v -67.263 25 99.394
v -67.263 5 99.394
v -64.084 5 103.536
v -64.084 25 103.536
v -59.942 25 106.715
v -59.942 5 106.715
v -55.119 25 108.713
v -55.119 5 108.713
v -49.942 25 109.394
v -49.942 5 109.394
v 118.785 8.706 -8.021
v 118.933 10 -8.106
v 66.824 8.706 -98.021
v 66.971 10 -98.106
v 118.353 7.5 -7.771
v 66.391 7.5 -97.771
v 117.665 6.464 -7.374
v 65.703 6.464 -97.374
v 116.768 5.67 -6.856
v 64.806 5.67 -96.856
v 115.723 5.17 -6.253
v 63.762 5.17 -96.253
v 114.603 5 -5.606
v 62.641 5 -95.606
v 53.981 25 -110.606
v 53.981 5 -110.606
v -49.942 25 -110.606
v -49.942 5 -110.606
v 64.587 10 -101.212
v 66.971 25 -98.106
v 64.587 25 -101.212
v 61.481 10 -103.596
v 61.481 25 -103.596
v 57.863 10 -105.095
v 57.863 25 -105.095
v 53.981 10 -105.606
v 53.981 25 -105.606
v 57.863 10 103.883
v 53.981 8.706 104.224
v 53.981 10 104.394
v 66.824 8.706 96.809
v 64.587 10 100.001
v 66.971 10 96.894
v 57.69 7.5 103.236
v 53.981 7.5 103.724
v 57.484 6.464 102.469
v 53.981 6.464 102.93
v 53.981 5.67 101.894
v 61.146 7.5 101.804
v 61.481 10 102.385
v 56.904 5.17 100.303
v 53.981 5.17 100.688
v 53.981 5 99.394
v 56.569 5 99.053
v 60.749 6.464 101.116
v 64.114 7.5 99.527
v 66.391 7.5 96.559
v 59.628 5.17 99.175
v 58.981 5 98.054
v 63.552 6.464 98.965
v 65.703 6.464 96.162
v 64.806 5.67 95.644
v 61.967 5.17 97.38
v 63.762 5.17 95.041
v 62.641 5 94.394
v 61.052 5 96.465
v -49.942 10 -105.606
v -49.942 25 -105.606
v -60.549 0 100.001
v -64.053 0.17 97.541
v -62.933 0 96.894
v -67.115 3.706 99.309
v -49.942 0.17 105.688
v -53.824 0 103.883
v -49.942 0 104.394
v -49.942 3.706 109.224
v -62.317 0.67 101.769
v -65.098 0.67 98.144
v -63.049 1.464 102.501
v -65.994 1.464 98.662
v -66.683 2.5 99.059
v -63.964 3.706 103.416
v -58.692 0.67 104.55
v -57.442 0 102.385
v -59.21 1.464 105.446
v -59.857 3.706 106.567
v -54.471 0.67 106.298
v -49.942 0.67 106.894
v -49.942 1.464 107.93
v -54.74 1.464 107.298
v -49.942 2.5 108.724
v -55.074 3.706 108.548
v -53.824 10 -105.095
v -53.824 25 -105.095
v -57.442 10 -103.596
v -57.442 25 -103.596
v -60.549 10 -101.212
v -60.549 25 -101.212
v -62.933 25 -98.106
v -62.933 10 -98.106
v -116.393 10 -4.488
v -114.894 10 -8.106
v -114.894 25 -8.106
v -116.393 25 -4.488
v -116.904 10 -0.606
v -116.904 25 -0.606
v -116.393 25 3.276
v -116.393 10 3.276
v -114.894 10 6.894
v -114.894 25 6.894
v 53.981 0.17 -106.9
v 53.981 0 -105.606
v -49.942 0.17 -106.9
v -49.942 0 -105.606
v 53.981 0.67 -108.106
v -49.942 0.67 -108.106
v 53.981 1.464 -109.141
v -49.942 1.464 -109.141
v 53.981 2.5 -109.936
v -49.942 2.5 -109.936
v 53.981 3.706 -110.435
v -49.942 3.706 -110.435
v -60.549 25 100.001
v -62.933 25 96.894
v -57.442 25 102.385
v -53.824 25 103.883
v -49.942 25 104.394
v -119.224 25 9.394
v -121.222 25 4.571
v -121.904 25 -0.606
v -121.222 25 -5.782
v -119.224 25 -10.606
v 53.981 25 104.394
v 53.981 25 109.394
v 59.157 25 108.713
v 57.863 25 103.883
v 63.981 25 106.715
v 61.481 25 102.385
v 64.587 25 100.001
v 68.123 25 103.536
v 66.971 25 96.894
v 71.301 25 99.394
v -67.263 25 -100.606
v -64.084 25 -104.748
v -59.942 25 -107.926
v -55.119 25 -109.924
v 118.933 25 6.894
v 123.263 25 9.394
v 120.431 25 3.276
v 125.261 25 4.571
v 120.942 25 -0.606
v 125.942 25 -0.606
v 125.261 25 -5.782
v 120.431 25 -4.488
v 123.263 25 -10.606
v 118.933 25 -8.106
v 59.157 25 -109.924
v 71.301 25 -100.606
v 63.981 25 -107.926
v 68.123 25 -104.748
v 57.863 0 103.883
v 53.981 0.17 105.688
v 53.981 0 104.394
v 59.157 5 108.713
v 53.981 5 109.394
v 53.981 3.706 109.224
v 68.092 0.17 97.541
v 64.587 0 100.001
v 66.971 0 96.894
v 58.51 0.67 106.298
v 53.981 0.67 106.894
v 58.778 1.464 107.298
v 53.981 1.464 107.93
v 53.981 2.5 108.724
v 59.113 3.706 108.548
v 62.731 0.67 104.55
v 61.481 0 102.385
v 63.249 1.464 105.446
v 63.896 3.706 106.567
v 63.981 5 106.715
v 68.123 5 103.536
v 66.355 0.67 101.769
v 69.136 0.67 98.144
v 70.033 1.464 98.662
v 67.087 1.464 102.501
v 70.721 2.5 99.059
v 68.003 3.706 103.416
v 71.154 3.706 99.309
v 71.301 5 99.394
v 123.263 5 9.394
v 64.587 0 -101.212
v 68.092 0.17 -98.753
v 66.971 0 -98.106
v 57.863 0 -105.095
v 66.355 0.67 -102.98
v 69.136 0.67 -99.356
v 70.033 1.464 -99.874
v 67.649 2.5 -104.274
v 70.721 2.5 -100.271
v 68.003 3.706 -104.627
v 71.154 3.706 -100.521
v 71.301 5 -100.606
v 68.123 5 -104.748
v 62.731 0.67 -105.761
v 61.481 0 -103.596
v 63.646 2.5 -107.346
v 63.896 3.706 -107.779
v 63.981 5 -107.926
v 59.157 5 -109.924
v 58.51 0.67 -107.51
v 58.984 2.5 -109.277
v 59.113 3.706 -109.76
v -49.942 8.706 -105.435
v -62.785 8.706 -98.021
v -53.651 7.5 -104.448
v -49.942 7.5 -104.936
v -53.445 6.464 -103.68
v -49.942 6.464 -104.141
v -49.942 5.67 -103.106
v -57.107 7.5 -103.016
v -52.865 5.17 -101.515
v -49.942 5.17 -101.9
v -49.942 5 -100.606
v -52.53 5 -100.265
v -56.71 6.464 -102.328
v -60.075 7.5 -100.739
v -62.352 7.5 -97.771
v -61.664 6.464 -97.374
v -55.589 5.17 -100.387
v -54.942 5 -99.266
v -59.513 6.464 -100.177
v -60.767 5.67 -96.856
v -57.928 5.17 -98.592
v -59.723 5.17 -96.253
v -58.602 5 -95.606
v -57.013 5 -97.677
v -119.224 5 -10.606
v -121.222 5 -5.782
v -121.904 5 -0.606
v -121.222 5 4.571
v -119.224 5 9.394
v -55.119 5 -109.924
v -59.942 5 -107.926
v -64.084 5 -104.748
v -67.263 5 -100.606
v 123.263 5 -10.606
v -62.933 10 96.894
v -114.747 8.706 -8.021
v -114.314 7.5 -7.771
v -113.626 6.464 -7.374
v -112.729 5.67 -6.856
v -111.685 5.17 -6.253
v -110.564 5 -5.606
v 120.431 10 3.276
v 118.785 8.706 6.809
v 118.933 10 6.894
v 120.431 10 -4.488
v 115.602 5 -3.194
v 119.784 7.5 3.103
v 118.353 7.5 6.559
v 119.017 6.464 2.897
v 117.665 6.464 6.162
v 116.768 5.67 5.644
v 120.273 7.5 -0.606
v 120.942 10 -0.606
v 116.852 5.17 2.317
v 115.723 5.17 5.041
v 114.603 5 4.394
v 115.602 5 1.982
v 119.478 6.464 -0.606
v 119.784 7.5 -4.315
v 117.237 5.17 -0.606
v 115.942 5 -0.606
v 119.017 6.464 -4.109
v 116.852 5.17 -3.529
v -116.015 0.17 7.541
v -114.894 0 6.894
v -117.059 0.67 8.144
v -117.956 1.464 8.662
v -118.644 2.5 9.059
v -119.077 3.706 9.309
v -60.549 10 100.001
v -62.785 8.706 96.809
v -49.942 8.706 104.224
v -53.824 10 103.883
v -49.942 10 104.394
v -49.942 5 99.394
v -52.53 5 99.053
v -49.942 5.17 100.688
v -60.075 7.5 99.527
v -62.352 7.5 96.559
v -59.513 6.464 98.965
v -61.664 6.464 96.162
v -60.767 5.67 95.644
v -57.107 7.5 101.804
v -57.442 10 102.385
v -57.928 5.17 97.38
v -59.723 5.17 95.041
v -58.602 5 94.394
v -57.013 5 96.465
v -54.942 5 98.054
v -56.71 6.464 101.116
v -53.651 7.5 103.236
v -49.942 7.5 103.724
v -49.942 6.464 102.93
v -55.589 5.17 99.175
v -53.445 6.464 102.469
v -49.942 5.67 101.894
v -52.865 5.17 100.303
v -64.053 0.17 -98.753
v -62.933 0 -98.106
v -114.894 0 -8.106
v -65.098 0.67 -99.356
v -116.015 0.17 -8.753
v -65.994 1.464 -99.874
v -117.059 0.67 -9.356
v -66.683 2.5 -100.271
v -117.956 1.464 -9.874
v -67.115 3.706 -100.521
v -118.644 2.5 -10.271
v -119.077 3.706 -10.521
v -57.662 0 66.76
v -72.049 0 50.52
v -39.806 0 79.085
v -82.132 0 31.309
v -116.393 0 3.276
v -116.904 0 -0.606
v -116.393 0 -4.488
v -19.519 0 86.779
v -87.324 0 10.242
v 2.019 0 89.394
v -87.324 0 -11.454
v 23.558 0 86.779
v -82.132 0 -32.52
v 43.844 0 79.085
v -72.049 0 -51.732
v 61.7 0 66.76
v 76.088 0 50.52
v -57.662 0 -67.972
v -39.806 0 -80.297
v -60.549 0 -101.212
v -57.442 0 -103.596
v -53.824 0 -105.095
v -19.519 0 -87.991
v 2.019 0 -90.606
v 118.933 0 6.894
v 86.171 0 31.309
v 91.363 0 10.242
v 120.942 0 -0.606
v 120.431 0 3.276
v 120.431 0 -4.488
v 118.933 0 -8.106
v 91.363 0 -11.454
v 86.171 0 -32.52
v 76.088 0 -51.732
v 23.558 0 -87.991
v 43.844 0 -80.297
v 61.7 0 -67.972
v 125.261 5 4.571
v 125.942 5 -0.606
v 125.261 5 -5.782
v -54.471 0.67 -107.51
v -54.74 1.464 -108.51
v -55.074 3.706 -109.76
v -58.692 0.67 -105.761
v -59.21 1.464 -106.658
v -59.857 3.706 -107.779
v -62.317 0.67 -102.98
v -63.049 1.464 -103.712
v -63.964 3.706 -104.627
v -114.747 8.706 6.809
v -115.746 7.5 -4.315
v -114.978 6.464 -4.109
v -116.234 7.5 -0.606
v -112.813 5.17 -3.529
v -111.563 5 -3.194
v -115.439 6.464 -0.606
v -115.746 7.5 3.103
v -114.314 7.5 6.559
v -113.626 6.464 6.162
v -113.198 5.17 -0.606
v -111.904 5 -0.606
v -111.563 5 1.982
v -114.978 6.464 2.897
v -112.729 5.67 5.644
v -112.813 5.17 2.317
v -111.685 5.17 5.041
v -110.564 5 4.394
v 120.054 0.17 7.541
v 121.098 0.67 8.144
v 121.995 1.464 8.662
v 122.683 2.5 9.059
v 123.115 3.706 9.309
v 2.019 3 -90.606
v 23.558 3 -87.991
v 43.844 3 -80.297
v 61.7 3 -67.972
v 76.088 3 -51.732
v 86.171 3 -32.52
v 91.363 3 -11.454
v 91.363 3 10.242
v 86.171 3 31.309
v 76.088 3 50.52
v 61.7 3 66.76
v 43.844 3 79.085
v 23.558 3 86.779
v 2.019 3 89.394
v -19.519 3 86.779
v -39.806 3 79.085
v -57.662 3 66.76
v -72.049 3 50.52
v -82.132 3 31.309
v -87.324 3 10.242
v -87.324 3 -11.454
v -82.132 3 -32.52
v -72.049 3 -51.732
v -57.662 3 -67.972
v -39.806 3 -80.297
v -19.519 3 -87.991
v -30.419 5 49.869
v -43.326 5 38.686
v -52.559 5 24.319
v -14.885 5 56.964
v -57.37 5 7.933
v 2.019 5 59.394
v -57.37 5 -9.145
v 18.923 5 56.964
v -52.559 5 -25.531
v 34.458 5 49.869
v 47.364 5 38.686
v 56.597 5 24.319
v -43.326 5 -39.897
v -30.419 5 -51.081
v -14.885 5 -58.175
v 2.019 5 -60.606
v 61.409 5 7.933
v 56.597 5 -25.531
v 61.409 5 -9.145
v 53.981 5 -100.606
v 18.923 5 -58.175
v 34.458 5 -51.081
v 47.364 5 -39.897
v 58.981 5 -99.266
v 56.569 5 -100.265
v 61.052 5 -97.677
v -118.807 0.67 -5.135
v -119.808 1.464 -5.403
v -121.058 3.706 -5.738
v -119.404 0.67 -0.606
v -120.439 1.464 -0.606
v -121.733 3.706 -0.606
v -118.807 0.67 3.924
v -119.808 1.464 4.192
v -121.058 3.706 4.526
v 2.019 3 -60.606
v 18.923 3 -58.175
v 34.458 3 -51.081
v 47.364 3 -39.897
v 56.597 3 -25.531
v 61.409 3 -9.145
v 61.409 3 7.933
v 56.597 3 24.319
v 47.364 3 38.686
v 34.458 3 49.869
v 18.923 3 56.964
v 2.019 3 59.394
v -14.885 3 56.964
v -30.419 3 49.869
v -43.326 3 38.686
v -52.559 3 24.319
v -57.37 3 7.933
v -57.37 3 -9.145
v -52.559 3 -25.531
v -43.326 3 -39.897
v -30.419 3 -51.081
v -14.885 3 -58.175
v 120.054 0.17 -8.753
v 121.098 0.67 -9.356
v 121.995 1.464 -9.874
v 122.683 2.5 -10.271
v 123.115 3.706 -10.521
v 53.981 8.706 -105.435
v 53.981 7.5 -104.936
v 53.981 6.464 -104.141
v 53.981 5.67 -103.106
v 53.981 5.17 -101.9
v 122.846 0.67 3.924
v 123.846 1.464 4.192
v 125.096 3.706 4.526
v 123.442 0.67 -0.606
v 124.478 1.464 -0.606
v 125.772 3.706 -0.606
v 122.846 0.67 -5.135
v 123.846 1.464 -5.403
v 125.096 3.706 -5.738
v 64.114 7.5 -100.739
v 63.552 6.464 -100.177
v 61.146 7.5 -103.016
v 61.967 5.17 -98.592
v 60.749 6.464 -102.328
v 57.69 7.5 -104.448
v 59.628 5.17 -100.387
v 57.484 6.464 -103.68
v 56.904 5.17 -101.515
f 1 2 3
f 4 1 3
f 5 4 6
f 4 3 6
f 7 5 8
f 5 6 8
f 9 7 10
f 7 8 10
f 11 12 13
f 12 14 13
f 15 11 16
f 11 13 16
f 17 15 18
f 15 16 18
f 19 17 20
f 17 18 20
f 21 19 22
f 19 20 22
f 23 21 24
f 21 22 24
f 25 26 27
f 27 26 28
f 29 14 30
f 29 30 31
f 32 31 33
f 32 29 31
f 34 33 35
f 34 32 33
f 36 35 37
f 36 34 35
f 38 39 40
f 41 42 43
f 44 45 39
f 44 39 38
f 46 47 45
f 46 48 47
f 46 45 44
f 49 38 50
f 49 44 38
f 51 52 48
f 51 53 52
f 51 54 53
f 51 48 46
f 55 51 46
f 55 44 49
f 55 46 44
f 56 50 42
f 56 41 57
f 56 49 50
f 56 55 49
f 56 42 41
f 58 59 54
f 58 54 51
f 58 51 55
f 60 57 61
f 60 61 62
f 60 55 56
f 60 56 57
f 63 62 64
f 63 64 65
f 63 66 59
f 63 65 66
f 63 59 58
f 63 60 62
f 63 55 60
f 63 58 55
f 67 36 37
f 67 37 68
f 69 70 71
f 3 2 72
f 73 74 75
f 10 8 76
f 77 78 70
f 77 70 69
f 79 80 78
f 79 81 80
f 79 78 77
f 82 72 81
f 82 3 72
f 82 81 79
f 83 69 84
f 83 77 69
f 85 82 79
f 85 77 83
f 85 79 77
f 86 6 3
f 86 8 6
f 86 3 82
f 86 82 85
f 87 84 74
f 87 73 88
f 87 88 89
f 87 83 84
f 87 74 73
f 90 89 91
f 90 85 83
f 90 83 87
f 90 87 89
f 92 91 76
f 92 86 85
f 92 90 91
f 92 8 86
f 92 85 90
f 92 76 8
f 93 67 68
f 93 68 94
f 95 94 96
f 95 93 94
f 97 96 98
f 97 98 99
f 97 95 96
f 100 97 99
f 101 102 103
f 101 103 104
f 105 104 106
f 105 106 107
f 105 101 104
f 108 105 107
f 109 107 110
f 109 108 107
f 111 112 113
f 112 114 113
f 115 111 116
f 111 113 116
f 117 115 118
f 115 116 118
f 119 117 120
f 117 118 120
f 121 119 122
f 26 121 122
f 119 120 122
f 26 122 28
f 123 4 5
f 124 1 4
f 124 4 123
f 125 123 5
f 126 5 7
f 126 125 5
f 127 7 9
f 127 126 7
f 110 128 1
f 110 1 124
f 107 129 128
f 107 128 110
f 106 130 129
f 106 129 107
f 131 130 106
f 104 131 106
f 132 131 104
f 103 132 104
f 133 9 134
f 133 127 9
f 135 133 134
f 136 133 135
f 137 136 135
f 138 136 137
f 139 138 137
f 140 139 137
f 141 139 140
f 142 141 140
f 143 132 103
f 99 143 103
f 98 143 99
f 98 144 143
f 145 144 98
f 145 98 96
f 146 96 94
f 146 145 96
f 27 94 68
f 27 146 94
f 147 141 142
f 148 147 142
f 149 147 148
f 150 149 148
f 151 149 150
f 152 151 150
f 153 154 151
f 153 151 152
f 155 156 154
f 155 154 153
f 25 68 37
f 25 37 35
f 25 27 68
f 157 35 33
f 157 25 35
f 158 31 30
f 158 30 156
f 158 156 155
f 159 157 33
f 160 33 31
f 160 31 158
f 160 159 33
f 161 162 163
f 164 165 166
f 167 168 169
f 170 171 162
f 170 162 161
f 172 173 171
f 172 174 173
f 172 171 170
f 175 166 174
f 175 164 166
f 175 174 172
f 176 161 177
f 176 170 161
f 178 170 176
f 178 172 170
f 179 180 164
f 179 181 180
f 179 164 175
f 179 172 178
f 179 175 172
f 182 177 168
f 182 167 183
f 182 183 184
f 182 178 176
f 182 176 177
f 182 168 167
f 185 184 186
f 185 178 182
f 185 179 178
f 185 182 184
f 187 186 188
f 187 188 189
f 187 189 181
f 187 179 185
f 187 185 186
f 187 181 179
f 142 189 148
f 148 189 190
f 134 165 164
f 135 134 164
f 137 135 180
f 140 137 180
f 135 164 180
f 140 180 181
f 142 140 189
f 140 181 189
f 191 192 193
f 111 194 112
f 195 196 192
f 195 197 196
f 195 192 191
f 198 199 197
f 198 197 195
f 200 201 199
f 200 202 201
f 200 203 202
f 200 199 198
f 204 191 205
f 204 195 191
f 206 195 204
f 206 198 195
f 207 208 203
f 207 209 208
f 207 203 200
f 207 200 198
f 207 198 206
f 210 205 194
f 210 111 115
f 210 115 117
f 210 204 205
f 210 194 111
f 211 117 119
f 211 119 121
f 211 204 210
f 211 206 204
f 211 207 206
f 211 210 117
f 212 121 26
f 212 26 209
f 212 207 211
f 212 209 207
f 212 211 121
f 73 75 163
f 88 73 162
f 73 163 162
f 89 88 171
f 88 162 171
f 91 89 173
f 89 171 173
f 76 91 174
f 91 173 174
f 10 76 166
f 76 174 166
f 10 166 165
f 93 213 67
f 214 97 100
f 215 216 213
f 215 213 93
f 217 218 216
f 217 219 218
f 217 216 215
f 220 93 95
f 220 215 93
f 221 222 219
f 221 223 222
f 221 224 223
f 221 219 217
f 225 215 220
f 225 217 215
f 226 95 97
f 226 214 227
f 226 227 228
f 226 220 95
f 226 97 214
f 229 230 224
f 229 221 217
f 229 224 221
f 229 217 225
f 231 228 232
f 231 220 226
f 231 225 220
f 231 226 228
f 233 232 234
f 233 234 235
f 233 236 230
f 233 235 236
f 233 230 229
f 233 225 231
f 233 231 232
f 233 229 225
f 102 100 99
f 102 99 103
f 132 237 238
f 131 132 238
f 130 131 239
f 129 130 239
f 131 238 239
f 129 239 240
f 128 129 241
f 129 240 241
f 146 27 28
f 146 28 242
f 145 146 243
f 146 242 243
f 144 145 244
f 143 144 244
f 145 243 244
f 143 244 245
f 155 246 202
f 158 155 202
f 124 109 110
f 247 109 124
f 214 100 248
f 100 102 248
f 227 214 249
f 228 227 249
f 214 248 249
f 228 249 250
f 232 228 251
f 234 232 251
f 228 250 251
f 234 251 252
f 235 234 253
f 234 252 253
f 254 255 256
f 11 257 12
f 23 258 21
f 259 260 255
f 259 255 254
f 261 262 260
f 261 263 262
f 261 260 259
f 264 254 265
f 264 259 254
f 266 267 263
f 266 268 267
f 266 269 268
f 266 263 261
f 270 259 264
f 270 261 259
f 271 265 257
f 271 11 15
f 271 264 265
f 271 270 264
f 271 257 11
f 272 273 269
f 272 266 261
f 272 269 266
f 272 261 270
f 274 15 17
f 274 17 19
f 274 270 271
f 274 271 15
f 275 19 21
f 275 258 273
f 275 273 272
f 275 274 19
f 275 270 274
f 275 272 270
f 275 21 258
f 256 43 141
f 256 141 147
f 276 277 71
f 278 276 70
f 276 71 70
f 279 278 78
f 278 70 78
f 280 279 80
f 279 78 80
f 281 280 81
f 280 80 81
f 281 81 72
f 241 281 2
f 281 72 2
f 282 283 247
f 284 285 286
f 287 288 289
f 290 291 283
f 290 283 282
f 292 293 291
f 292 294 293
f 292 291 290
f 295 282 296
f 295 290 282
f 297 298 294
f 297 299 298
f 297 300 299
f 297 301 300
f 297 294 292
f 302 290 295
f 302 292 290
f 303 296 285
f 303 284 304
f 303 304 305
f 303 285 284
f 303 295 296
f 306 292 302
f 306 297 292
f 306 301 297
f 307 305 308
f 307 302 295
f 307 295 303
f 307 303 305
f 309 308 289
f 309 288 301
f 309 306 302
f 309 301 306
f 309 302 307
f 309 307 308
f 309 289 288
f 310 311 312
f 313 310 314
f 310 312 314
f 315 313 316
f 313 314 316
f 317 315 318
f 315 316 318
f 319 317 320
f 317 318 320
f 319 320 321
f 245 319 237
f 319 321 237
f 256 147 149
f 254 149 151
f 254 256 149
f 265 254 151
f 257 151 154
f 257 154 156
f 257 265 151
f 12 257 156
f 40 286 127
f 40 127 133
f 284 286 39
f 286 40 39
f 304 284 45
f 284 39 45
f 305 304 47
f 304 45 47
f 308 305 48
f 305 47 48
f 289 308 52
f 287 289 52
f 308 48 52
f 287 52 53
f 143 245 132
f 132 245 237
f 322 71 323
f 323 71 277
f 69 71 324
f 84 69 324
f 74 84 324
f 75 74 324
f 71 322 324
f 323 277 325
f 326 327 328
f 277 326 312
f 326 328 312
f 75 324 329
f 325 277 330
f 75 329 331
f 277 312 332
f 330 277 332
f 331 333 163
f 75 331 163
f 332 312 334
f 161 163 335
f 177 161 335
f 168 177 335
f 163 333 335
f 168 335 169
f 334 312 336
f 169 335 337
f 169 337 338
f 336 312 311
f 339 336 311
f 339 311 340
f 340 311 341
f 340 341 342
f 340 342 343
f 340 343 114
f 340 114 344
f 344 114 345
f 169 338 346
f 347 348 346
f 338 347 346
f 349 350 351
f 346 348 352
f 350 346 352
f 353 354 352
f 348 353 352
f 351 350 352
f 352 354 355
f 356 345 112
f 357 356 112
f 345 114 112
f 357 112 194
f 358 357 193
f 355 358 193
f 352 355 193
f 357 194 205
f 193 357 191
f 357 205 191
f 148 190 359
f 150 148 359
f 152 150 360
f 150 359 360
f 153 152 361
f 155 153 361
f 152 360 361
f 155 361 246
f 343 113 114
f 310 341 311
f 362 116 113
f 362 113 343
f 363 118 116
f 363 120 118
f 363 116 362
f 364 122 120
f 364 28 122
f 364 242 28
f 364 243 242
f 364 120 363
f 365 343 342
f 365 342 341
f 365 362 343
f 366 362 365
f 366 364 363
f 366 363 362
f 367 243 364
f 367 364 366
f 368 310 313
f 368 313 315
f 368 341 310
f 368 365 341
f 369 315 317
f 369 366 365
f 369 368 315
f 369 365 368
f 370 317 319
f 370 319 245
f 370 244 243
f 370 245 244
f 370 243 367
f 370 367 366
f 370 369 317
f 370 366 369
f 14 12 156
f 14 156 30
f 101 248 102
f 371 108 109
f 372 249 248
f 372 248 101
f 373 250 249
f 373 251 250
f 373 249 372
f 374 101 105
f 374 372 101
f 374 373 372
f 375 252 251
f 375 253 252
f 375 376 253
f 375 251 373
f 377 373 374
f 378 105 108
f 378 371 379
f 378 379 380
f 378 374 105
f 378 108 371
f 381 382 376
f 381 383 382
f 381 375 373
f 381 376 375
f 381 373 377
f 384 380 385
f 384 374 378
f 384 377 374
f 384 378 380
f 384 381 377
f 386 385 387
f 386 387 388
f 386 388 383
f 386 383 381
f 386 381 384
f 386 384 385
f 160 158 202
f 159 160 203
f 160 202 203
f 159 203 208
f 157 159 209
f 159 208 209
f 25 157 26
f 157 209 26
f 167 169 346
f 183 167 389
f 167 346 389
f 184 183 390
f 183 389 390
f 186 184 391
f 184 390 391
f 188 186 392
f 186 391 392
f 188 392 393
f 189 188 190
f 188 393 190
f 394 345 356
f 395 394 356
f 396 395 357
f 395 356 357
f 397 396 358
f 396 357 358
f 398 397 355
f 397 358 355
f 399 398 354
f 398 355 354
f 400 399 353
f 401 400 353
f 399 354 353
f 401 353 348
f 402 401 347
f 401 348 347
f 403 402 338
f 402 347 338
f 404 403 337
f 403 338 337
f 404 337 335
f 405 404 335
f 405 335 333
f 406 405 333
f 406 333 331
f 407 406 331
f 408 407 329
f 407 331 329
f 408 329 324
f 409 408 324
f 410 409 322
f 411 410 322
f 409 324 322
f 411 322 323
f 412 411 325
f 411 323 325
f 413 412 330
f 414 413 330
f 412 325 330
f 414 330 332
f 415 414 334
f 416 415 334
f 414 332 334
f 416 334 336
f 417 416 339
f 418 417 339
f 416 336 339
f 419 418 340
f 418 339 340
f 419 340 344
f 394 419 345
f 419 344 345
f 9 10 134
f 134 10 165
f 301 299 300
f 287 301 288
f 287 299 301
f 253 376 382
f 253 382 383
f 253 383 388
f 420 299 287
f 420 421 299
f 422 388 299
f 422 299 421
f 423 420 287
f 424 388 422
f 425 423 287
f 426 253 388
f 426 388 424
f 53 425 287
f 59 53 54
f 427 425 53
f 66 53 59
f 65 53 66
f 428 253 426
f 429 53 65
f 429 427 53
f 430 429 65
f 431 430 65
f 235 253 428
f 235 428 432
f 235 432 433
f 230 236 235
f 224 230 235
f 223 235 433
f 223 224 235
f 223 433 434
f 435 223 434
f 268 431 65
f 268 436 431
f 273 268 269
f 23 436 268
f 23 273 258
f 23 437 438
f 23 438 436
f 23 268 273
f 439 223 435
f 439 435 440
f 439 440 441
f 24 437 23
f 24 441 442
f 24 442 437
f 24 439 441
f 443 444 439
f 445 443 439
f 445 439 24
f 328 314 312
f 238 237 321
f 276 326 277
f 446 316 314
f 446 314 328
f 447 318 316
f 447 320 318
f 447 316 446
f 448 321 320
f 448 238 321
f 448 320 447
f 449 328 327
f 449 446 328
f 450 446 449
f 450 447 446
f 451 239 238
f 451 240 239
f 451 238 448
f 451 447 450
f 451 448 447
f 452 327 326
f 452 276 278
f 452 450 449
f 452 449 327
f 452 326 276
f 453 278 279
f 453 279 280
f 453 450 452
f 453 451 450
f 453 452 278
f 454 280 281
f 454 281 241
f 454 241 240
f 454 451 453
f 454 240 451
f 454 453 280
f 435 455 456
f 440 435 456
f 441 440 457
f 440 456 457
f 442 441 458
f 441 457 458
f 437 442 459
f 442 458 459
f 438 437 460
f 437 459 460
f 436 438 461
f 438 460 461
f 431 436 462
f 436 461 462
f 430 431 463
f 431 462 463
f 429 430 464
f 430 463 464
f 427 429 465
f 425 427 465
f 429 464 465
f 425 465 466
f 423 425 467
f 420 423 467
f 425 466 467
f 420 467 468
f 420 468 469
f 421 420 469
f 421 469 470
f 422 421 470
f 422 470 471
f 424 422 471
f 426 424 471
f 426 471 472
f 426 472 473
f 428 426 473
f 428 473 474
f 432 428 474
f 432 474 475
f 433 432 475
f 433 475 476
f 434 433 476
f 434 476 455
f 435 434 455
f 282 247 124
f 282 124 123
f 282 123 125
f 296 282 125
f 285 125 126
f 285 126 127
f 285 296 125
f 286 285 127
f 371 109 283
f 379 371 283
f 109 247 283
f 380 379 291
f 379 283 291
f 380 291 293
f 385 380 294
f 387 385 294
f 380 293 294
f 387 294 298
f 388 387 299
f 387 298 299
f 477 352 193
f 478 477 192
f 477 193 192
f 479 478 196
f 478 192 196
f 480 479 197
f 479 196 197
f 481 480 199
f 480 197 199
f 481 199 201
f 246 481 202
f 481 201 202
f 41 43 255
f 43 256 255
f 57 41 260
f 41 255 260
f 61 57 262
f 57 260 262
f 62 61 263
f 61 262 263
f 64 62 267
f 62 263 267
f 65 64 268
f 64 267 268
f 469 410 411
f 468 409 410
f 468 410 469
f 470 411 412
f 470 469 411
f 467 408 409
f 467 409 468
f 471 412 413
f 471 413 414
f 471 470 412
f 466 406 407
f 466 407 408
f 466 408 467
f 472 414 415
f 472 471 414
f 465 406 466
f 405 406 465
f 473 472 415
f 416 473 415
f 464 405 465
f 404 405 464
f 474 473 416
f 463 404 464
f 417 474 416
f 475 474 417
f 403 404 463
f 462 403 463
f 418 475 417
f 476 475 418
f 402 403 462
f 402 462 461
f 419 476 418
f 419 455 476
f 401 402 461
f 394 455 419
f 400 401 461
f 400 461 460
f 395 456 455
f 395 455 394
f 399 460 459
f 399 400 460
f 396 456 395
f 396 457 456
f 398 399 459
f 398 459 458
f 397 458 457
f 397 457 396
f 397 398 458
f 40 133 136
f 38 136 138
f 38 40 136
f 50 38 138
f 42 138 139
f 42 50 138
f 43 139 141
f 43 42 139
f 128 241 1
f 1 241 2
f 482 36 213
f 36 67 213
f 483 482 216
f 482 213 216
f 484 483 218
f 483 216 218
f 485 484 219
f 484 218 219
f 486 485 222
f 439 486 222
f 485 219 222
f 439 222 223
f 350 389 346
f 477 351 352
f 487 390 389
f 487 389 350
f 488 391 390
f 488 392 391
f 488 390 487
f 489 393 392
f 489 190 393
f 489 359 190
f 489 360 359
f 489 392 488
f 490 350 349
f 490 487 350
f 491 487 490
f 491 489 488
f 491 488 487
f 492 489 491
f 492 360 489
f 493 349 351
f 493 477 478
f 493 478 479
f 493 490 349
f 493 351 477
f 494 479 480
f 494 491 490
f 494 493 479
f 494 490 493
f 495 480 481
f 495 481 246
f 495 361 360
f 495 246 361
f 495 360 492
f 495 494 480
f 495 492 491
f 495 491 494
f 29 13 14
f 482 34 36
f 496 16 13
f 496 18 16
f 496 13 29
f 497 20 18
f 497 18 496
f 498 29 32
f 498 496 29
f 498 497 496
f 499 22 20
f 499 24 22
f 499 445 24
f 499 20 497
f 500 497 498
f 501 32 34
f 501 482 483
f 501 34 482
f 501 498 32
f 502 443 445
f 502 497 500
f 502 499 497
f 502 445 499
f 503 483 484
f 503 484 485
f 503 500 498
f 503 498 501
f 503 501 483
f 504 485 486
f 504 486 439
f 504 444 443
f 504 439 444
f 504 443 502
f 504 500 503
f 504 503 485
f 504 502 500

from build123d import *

# Parameters (mm, degrees)
SALIENTE_EXTRUIR2_DEPTH = 5
SALIENTE_EXTRUIR3_DEPTH = 20
REDONDEO2_R             = 5
REDONDEO3_R             = 5
CROQUIS4_R              = 60
CORTAR_EXTRUIR1_DEPTH   = 10
CROQUIS3_R              = 90
CORTAR_EXTRUIR2_DEPTH   = 3


with BuildPart() as part:
    # Croquis1 → Saliente-Extruir2 (new body)
    with BuildSketch(Plane(origin=(0, 0, 0), x_dir=(1, 0, 0), z_dir=(0, 1, 0))):
        with BuildLine():
            Line((-119.224191345, -9.394190445), (-67.262667118, -99.394190445))
            ThreePointArc((-67.262667118, -99.394190445), (-59.942159042, -106.71469852), (-49.942159042, -109.394190445))
            Line((-49.942159042, -109.394190445), (53.980889412, -109.394190445))
            ThreePointArc((53.980889412, -109.394190445), (63.980889412, -106.71469852), (71.301397487, -99.394190445))
            Line((71.301397487, -99.394190445), (123.262921714, -9.394190445))
            ThreePointArc((123.262921714, -9.394190445), (125.942413639, 0.605809555), (123.262921714, 10.605809555))
            Line((123.262921714, 10.605809555), (71.301397487, 100.605809555))
            ThreePointArc((71.301397487, 100.605809555), (63.980889412, 107.926317631), (53.980889412, 110.605809555))
            Line((53.980889412, 110.605809555), (-49.942159042, 110.605809555))
            ThreePointArc((-49.942159042, 110.605809555), (-59.942159042, 107.926317631), (-67.262667118, 100.605809555))
            Line((-67.262667118, 100.605809555), (-119.224191345, 10.605809555))
            ThreePointArc((-119.224191345, 10.605809555), (-121.90368327, 0.605809555), (-119.224191345, -9.394190445))
        make_face()
    extrude(amount=SALIENTE_EXTRUIR2_DEPTH)

    # Croquis2 → Saliente-Extruir3 (add)
    with BuildSketch(Plane(origin=(0, 5, 0), x_dir=(1, 0, 0), z_dir=(0, 1, 0))):
        with BuildLine():
            Line((-67.262667118, 100.605809555), (-119.224191345, 10.605809555))
            ThreePointArc((-119.224191345, 10.605809555), (-121.90368327, 0.605809555), (-119.224191345, -9.394190445))
            Line((-119.224191345, -9.394190445), (-67.262667118, -99.394190445))
            ThreePointArc((-67.262667118, -99.394190445), (-59.942159042, -106.71469852), (-49.942159042, -109.394190445))
            Line((-49.942159042, -109.394190445), (53.980889412, -109.394190445))
            ThreePointArc((53.980889412, -109.394190445), (63.980889412, -106.71469852), (71.301397487, -99.394190445))
            Line((71.301397487, -99.394190445), (123.262921714, -9.394190445))
            ThreePointArc((123.262921714, -9.394190445), (125.942413639, 0.605809555), (123.262921714, 10.605809555))
            Line((123.262921714, 10.605809555), (71.301397487, 100.605809555))
            ThreePointArc((71.301397487, 100.605809555), (63.980889412, 107.926317631), (53.980889412, 110.605809555))
            Line((53.980889412, 110.605809555), (-49.942159042, 110.605809555))
            ThreePointArc((-49.942159042, 110.605809555), (-59.942159042, 107.926317631), (-67.262667118, 100.605809555))
        make_face()
        with BuildLine():
            Line((-62.932540099, 98.105809555), (-114.894064326, 8.105809555))
            ThreePointArc((-114.894064326, 8.105809555), (-116.90368327, 0.605809555), (-114.894064326, -6.894190445))
            Line((-114.894064326, -6.894190445), (-62.932540099, -96.894190445))
            ThreePointArc((-62.932540099, -96.894190445), (-57.442159042, -102.384571501), (-49.942159042, -104.394190445))
            Line((-49.942159042, -104.394190445), (53.980889412, -104.394190445))
            ThreePointArc((53.980889412, -104.394190445), (61.480889412, -102.384571501), (66.971270468, -96.894190445))
            Line((66.971270468, -96.894190445), (118.932794695, -6.894190445))
            ThreePointArc((118.932794695, -6.894190445), (120.942413639, 0.605809555), (118.932794695, 8.105809555))
            Line((118.932794695, 8.105809555), (66.971270468, 98.105809555))
            ThreePointArc((66.971270468, 98.105809555), (61.480889412, 103.596190612), (53.980889412, 105.605809555))
            Line((53.980889412, 105.605809555), (-49.942159042, 105.605809555))
            ThreePointArc((-49.942159042, 105.605809555), (-57.442159042, 103.596190612), (-62.932540099, 98.105809555))
        make_face(mode=Mode.SUBTRACT)
    extrude(amount=SALIENTE_EXTRUIR3_DEPTH)

    # Redondeo2
    redondeo2_edges = [part.edges().sort_by_distance(p)[0] for p in [
        (2.019365185, 0, -110.605809555),
        (63.980889412, 0, -107.926317631),
        (97.282159601, 0, -55.605809555),
        (125.942413639, 0, -0.605809555),
        (97.282159601, 0, 54.394190445),
        (63.980889412, 0, 106.71469852),
        (2.019365185, 0, 109.394190445),
        (-59.942159042, 0, 106.71469852),
        (-93.243429232, 0, 54.394190445),
        (-121.90368327, 0, -0.605809555),
        (-93.243429232, 0, -55.605809555),
        (-59.942159042, 0, -107.926317631),
    ]]
    fillet(redondeo2_edges, radius=REDONDEO2_R)

    # Redondeo3
    redondeo3_edges = [part.edges().sort_by_distance(p)[0] for p in [
        (-57.442159042, 5, -103.596190612),
        (-88.913302213, 5, -53.105809555),
        (-116.90368327, 5, -0.605809555),
        (-88.913302213, 5, 51.894190445),
        (-57.442159042, 5, 102.384571501),
        (2.019365185, 5, 104.394190445),
        (61.480889412, 5, 102.384571501),
        (92.952032582, 5, 51.894190445),
        (120.942413639, 5, -0.605809555),
        (92.952032582, 5, -53.105809555),
        (61.480889412, 5, -103.596190612),
        (2.019365185, 5, -105.605809555),
    ]]
    fillet(redondeo3_edges, radius=REDONDEO3_R)

    # Croquis4 → Cortar-Extruir1 (cut)
    with BuildSketch(Plane(origin=(0, 0, 0), x_dir=(-1, 0, 0), z_dir=(0, -1, 0))):
        with Locations(Location((-2.019365185, 0.605809555, 0), (0, 0, 90))):
            Circle(CROQUIS4_R)
    extrude(amount=-CORTAR_EXTRUIR1_DEPTH, mode=Mode.SUBTRACT)

    # Croquis3 → Cortar-Extruir2 (cut)
    with BuildSketch(Plane.XZ):
        with Locations(Location((2.019365185, -0.605809555, 0), (0, 0, 270))):
            Circle(CROQUIS3_R)
    extrude(amount=-CORTAR_EXTRUIR2_DEPTH, mode=Mode.SUBTRACT)


solid = part.part
